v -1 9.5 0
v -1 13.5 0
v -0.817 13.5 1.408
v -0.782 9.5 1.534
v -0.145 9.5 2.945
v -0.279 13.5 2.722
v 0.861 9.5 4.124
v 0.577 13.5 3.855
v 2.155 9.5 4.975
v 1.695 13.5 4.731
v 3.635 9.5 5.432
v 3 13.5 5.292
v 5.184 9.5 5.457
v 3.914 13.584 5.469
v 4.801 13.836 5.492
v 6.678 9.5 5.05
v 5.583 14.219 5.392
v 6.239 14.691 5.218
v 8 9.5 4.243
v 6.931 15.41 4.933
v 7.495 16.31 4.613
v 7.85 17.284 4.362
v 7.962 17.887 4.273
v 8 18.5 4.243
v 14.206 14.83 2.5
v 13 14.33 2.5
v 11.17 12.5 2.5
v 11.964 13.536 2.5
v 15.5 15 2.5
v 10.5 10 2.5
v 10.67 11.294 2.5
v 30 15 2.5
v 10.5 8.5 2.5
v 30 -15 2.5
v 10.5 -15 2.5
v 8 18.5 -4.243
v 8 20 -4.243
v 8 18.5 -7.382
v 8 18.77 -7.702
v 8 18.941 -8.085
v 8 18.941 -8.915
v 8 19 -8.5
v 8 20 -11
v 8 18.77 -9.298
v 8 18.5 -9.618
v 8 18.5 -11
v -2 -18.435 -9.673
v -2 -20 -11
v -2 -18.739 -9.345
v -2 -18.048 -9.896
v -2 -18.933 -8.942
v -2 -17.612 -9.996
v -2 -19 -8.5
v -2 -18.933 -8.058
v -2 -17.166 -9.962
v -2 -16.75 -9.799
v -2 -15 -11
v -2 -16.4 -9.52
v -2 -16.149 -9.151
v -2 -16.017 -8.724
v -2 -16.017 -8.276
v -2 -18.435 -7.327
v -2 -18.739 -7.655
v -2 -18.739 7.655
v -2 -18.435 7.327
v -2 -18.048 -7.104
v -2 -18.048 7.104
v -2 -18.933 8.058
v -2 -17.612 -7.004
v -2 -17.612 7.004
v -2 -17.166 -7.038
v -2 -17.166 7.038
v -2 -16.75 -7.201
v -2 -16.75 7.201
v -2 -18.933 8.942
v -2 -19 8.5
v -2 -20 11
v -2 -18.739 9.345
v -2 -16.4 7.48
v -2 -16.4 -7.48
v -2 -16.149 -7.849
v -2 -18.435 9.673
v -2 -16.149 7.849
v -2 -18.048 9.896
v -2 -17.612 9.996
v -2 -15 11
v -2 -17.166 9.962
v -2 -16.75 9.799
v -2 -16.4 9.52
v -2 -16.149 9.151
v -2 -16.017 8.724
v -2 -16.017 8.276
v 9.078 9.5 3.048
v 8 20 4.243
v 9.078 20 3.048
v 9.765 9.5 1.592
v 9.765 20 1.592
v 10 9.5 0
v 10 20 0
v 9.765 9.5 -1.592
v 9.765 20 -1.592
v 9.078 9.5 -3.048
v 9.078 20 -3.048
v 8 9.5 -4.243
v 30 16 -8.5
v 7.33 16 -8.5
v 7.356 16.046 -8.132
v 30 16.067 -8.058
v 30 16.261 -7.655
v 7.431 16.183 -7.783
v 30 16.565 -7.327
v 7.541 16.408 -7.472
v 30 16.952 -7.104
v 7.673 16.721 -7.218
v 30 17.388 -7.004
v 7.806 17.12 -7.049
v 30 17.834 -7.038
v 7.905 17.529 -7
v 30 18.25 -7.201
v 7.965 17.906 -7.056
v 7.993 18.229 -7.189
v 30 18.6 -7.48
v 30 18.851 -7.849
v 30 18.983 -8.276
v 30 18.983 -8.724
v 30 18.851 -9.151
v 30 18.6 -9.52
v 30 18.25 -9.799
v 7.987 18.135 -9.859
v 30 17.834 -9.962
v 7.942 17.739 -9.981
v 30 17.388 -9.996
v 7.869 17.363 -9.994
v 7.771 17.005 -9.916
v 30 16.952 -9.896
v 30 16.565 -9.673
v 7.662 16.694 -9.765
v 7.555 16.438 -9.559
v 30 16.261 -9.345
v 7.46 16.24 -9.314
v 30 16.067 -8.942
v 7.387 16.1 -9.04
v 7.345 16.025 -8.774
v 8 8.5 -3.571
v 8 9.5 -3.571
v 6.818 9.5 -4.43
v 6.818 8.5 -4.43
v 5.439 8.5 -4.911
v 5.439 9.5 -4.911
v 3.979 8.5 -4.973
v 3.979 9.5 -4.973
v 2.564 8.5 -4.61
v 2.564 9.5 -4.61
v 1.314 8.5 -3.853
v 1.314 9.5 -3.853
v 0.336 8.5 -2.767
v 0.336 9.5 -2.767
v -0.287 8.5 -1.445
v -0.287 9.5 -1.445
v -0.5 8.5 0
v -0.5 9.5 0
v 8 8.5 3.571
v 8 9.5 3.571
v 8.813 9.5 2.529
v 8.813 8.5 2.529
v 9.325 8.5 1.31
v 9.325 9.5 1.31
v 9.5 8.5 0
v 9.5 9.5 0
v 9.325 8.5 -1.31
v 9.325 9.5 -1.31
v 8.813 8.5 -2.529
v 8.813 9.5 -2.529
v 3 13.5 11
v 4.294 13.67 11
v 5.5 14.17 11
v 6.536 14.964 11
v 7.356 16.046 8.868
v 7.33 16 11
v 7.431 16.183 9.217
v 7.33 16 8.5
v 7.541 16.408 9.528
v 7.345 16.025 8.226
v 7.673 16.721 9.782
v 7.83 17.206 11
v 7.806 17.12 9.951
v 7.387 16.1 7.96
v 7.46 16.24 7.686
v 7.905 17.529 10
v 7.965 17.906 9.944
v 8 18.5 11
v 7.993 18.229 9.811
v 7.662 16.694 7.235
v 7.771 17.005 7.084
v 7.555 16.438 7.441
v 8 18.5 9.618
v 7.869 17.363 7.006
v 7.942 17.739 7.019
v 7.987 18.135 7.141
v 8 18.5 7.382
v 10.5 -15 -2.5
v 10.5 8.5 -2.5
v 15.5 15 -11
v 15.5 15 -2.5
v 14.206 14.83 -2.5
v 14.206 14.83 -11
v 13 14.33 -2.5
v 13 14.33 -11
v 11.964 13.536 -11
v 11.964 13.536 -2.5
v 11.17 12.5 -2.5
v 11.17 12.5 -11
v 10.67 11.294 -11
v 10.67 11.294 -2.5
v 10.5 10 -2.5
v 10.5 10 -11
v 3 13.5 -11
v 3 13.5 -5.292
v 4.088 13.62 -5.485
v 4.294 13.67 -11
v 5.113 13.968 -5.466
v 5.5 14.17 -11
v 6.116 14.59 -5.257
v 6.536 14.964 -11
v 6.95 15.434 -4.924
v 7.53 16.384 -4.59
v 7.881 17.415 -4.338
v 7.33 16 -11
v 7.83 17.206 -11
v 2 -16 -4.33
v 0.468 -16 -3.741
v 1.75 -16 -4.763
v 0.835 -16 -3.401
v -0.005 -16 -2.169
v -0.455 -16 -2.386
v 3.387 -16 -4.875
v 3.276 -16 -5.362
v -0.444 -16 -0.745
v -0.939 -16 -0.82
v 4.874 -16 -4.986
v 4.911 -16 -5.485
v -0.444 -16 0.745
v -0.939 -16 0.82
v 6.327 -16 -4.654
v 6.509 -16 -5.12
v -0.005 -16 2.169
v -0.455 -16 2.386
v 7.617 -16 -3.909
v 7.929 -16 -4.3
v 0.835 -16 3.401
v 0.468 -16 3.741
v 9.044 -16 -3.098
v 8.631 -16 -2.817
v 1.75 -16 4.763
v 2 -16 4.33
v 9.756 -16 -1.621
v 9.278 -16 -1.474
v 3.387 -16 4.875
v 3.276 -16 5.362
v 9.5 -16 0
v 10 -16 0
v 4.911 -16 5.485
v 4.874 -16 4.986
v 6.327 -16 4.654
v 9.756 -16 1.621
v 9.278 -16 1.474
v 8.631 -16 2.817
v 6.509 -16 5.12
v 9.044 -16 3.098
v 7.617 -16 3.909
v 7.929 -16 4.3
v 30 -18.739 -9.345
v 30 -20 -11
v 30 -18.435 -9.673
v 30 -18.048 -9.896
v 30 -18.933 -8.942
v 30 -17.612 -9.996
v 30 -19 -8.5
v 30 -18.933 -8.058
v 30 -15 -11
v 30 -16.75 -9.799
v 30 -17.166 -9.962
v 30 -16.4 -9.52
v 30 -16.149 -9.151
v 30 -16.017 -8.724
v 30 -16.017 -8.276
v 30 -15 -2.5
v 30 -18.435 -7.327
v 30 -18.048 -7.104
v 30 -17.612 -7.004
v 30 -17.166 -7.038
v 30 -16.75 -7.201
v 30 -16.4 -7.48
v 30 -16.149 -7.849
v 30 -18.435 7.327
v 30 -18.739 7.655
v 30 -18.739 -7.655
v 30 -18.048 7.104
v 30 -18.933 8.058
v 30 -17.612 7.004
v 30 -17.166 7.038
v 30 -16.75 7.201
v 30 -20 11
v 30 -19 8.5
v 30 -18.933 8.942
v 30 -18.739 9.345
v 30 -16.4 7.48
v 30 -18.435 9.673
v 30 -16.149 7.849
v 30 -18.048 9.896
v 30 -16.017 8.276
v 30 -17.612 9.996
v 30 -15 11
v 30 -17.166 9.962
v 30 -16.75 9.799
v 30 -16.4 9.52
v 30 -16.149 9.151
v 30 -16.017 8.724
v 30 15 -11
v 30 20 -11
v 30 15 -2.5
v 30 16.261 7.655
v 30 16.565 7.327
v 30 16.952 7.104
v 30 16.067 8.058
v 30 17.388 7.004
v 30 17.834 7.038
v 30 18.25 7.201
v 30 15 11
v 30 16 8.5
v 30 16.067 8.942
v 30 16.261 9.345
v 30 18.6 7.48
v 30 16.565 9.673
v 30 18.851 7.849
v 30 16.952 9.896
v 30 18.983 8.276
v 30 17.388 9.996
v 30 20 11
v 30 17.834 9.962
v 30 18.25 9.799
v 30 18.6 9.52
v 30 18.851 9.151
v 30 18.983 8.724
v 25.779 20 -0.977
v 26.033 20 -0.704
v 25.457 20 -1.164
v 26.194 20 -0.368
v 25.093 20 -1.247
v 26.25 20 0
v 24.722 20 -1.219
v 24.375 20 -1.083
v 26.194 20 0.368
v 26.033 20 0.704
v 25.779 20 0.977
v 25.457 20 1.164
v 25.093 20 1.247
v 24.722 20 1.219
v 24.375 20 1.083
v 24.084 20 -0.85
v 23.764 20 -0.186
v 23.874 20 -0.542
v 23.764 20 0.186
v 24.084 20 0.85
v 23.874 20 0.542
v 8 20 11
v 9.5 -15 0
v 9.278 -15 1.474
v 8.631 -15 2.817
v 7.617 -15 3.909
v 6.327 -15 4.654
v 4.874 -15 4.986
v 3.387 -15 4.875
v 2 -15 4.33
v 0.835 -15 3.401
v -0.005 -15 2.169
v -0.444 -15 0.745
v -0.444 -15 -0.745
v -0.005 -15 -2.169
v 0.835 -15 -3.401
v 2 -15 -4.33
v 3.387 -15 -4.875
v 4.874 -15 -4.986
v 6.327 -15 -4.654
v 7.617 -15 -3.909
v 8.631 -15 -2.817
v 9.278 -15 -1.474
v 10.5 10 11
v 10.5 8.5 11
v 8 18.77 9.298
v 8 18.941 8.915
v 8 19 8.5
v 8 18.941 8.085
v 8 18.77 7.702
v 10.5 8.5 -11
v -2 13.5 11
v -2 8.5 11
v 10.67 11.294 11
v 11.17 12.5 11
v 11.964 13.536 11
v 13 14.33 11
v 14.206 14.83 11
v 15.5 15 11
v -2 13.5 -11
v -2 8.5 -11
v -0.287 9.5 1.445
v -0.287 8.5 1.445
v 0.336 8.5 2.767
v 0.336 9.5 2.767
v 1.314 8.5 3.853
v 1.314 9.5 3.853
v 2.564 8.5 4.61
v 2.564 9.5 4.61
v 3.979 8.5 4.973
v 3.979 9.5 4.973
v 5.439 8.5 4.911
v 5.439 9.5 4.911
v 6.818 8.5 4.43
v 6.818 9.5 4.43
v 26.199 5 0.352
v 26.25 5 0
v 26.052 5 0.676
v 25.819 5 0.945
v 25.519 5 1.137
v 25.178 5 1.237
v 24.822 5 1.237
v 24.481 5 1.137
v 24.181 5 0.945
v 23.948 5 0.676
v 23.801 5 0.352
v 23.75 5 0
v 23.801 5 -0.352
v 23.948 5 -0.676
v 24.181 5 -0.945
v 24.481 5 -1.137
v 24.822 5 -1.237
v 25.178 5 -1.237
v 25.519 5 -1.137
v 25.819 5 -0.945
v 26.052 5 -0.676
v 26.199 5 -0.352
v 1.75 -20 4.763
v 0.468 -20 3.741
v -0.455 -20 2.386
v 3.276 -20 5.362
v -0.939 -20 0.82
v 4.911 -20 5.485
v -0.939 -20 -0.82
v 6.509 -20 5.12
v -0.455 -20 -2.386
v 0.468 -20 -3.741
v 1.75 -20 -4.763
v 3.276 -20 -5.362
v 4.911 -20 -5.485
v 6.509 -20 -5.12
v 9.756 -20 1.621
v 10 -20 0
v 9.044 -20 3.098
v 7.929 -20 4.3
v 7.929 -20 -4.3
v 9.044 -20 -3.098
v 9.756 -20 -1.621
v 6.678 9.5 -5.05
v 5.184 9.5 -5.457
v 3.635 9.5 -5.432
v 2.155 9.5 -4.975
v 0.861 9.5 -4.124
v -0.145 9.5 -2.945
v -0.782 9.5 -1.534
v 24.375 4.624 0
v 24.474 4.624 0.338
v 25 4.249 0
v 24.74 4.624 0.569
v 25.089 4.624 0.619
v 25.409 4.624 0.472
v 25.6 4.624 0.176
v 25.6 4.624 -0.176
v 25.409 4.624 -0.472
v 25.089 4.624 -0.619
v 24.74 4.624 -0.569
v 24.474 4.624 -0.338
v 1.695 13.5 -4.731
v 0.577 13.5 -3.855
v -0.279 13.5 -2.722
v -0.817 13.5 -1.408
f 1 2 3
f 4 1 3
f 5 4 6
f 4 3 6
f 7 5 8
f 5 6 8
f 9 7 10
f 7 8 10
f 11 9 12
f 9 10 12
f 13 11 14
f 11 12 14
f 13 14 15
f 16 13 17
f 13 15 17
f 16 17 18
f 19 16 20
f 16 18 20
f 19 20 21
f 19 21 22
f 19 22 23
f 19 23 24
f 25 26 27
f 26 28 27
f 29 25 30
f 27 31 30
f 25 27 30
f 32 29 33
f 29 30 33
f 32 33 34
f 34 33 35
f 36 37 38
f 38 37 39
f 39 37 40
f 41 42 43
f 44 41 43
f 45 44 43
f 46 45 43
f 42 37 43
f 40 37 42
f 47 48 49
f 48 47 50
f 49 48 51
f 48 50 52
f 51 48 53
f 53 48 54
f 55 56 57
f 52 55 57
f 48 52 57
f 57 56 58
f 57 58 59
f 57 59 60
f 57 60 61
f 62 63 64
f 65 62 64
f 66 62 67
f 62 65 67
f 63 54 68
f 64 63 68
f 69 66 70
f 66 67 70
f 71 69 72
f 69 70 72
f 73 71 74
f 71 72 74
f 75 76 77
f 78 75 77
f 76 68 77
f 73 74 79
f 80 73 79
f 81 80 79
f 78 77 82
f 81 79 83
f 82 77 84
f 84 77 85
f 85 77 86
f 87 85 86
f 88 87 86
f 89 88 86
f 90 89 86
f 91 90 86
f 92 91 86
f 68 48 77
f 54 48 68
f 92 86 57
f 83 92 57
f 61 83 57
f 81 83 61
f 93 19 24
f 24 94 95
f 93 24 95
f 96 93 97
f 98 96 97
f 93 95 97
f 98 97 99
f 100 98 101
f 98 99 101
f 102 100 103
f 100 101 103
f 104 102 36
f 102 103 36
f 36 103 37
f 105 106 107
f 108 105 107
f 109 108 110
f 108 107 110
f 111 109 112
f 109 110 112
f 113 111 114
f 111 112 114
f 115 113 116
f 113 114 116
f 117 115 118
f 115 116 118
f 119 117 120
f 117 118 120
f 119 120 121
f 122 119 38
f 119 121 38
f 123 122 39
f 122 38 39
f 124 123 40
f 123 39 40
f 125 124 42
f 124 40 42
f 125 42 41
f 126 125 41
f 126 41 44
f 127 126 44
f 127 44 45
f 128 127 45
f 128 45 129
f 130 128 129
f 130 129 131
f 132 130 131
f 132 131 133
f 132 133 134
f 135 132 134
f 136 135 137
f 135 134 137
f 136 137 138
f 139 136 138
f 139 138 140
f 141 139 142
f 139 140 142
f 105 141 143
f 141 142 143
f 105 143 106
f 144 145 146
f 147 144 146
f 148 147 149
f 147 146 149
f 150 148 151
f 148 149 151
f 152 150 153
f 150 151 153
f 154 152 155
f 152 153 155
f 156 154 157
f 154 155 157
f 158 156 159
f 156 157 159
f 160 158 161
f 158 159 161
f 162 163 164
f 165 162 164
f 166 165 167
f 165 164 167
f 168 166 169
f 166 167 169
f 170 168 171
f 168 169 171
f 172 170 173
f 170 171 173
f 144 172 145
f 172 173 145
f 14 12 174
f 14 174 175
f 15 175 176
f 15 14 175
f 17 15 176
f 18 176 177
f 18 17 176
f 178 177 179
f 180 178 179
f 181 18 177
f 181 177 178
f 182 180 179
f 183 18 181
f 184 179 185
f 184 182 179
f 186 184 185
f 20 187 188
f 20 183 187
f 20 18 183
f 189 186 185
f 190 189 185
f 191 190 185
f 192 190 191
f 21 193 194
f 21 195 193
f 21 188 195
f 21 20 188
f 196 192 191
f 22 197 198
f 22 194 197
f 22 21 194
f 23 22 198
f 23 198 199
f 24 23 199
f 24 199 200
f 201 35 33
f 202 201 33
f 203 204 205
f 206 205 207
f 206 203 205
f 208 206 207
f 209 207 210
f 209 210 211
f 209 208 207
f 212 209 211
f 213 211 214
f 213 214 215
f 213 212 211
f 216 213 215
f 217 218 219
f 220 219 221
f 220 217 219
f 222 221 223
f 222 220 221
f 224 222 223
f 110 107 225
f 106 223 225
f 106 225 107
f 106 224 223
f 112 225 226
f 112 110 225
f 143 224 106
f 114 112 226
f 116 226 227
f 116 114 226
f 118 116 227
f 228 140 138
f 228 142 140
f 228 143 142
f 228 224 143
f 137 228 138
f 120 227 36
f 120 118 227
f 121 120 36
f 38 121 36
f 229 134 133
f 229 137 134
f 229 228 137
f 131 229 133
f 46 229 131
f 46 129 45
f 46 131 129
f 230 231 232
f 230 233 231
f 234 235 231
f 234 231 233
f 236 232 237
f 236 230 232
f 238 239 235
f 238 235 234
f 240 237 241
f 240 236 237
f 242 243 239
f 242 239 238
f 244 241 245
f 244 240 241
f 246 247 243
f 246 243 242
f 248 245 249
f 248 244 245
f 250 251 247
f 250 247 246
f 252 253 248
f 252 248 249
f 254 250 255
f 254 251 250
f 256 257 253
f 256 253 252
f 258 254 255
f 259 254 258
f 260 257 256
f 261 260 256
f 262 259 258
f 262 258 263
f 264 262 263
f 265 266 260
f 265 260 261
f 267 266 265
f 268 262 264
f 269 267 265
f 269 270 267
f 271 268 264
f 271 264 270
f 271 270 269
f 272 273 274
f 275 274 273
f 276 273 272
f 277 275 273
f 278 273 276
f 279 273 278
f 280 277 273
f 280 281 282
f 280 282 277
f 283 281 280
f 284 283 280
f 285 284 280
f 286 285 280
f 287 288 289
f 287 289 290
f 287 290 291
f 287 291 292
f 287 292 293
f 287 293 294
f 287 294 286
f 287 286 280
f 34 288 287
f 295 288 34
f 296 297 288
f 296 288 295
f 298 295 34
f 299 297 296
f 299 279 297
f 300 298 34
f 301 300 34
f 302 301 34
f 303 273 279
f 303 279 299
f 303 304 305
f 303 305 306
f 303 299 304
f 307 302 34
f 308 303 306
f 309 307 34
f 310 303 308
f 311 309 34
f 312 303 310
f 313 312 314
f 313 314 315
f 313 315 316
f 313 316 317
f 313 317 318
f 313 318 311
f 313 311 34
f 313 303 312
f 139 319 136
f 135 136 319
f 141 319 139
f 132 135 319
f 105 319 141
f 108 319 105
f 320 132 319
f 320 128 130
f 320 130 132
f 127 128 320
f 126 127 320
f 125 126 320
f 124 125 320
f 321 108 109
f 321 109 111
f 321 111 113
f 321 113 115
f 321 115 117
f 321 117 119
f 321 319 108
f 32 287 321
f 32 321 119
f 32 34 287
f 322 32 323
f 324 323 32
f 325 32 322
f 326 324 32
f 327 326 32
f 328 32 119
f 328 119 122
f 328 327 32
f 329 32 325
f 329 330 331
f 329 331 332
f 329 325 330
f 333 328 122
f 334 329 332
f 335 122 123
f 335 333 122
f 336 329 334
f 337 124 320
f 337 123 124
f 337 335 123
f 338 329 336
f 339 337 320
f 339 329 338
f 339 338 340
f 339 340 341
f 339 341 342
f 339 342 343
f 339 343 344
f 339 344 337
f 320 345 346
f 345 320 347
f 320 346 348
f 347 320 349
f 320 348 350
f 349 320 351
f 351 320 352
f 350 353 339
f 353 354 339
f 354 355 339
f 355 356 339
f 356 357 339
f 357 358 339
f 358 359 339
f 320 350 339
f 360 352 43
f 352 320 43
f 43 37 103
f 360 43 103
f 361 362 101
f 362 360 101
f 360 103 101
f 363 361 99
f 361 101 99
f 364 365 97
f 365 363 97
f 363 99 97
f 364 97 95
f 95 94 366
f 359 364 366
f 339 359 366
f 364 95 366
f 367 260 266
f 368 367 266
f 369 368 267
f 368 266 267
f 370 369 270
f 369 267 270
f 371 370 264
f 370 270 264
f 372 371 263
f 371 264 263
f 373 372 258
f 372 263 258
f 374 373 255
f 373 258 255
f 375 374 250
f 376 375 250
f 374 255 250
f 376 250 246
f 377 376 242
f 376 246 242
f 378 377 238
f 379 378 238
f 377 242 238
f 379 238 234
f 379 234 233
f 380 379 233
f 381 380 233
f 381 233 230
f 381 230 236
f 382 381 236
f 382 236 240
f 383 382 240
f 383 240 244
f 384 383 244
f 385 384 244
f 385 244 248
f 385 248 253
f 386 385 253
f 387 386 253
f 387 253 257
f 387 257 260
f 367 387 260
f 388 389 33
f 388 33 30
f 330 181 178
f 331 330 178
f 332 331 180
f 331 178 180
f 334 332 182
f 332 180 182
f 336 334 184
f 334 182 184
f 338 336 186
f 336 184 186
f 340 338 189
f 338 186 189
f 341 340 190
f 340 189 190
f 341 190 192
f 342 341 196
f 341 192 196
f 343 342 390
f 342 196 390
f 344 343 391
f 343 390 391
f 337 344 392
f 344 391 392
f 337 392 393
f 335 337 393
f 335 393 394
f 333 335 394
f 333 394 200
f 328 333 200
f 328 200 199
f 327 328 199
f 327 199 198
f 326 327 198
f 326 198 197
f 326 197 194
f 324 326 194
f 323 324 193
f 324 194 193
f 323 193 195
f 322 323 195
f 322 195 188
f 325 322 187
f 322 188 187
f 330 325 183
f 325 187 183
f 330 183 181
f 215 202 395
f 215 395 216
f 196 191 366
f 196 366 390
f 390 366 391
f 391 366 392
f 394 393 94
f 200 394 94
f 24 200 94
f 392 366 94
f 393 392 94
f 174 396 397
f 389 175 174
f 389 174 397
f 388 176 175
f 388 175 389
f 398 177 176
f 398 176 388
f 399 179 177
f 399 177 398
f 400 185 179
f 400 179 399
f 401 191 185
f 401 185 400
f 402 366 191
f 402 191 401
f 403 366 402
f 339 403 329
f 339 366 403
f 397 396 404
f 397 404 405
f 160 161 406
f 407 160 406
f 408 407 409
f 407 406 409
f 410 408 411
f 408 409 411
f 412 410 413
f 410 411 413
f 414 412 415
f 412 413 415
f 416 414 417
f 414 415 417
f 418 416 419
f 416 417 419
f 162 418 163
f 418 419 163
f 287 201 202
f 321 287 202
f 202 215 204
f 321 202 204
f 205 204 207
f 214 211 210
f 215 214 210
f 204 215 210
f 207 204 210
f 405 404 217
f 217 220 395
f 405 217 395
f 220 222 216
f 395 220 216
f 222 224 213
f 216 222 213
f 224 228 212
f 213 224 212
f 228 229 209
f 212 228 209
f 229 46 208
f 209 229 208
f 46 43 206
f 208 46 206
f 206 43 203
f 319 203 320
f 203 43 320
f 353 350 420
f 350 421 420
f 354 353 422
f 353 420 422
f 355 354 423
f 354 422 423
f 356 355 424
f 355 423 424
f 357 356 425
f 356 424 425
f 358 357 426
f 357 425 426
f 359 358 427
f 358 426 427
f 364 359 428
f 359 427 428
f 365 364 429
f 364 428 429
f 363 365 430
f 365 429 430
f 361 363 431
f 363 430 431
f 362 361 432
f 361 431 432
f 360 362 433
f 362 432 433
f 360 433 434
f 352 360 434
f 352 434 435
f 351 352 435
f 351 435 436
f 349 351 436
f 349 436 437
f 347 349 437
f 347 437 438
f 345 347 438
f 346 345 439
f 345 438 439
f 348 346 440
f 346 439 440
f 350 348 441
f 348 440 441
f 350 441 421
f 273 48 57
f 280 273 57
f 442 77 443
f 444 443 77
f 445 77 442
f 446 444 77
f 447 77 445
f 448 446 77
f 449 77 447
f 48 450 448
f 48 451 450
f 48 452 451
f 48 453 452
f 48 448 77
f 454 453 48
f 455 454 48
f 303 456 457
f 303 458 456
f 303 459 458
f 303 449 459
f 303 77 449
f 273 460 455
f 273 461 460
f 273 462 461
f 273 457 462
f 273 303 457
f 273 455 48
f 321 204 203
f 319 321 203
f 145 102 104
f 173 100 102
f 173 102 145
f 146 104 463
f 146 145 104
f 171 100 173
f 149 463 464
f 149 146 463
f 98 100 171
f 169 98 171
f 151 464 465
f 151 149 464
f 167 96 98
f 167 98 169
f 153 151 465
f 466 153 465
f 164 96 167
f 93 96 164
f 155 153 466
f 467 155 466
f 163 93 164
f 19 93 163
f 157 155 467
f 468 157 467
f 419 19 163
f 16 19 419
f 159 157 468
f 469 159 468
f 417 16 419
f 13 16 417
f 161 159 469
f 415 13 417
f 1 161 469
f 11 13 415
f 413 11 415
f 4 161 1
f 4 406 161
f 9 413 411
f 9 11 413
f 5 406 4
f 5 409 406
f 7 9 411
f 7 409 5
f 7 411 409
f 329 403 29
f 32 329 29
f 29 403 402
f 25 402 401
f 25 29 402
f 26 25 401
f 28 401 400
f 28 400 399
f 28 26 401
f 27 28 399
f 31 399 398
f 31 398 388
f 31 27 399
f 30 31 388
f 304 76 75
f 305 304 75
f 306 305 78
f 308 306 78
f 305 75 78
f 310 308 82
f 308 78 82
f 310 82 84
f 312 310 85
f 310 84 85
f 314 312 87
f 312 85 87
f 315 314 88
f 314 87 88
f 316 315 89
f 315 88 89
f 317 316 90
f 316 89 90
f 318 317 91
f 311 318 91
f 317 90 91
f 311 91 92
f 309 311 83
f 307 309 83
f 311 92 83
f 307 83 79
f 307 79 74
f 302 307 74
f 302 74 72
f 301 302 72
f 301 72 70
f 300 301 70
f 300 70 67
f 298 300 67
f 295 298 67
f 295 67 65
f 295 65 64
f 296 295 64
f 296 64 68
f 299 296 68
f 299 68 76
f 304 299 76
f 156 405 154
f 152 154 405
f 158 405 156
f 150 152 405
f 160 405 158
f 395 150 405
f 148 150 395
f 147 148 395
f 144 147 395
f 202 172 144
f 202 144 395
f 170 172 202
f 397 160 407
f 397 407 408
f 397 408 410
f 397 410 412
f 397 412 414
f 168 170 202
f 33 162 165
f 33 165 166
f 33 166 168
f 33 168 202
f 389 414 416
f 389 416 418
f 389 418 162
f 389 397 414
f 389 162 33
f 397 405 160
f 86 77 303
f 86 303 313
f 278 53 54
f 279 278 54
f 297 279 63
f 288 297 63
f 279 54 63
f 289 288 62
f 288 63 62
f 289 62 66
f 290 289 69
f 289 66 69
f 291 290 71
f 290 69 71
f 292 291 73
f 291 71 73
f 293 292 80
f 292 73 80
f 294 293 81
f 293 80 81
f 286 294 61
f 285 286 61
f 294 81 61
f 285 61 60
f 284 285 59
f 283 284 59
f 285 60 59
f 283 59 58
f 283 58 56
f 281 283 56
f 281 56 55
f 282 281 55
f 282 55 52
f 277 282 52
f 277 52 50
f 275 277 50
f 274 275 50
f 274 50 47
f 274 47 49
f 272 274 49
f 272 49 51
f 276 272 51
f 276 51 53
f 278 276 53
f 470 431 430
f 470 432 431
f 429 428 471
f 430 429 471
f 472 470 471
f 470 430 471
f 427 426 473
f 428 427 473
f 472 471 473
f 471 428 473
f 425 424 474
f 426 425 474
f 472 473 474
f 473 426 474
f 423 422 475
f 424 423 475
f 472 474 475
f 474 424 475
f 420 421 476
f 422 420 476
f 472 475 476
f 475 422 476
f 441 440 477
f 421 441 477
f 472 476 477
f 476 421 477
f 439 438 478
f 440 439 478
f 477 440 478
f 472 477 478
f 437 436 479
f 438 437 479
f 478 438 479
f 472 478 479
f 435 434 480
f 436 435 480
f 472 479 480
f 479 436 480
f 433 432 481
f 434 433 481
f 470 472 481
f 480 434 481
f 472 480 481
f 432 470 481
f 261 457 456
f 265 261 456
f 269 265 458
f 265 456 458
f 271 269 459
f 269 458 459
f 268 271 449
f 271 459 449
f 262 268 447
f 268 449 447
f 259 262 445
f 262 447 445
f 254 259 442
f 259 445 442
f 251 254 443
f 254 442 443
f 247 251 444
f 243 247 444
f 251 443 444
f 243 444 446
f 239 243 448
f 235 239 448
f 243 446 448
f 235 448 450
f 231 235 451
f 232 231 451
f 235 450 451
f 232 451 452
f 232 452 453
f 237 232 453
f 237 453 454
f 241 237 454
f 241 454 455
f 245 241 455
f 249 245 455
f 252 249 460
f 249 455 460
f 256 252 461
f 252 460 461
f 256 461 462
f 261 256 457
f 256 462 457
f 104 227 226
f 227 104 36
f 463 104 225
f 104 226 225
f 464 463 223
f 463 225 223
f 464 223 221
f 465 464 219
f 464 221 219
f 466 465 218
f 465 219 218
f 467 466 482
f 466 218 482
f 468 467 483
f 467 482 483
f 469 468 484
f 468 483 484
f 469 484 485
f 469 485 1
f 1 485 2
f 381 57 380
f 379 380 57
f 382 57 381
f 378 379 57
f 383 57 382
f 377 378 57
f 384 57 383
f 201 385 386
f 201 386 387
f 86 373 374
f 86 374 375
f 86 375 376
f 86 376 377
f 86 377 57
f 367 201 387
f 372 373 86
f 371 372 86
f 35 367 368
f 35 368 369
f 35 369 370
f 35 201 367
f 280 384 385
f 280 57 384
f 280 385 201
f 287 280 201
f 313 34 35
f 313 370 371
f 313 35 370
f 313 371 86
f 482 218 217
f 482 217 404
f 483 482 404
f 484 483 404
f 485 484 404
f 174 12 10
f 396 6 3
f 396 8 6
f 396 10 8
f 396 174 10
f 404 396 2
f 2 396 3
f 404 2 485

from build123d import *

# Parameters (mm, degrees)
F0_W      = 5
F0_H      = 5
F0_H_2    = 8.5
F0_W_2    = 30
F1_DEPTH  = 30
F2_DEPTH  = 2
F4_W      = 10.5
F4_H      = 30
F5_DEPTH  = 13.501
F3_R      = 5.5
F3_R_2    = 5
F3_R_3    = 2.5
F6_DEPTH  = 4
F7_DEPTH  = 5
F9_DEPTH  = 22
F10_DEPTH = 8
F11_DEPTH = 1.5
F12_R     = 5
F13_R     = 5
F15_DEPTH = 10.5
F14_R     = 2.5
F16_DEPTH = 11.5
F18_D     = 3
F20_D     = 2.5
F20_DEPTH = 15
F20_TIP   = 0.7510757738


# Not quite as in the source:
# - a feature names something its author has since deleted; it is built from what else it names


with BuildPart() as f1:
    # F0 (on Right) → F1 (new body)
    with BuildSketch(Plane.YZ):
        with Locations((17.5, 0)):
            Rectangle(F0_W, F0_H)
        with Locations((17.5, 6.75)):
            Rectangle(F0_W, F0_H_2)
        Rectangle(F0_W_2, F0_H)
        with Locations((17.5, -6.75)):
            Rectangle(F0_W, F0_H_2)
        with Locations((-17.5, 0)):
            Rectangle(F0_W, F0_H)
        with Locations((-17.5, 6.75)):
            Rectangle(F0_W, F0_H_2)
        with Locations((-17.5, -6.75)):
            Rectangle(F0_W, F0_H_2)
    extrude(amount=F1_DEPTH)

    # F0 (on Right) → F2 (join)
    with BuildSketch(Plane.YZ):
        with Locations((-17.5, 6.75)):
            Rectangle(F0_W, F0_H_2)
        with Locations((-17.5, 0)):
            Rectangle(F0_W, F0_H)
        with Locations((-17.5, -6.75)):
            Rectangle(F0_W, F0_H_2)
    extrude(amount=-F2_DEPTH)

    # F4 (on face) → F5 (cut, through all)
    with BuildSketch(Plane.XY.offset(2.5)):
        with Locations((5.25, 0)):
            Rectangle(F4_W, F4_H)
    extrude(amount=-F5_DEPTH, mode=Mode.SUBTRACT)

    # F3 (on face) → F6 (cut)
    with BuildSketch(Plane.XZ.offset(20)):
        with Locations((4.5, 0)):
            Circle(F3_R)
        with Locations((4.5, 0)):
            Circle(F3_R_2, mode=Mode.SUBTRACT)
        with Locations((4.5, 0)):
            Circle(F3_R_2)
        with Locations((4.5, 0)):
            Circle(F3_R_3, mode=Mode.SUBTRACT)
        with Locations((4.5, 0)):
            Circle(F3_R_3)
    extrude(amount=-F6_DEPTH, mode=Mode.SUBTRACT)

    # F3 (on face) → F7 (cut, through all)
    with BuildSketch(Plane.XZ.offset(20)):
        with Locations((4.5, 0)):
            Circle(F3_R_2)
        with Locations((4.5, 0)):
            Circle(F3_R_3, mode=Mode.SUBTRACT)
        with Locations((4.5, 0)):
            Circle(F3_R_3)
    extrude(amount=-F7_DEPTH, mode=Mode.SUBTRACT)

    # F8 (on face) → F9 (join, through all)
    with BuildSketch(Plane.XY.offset(11)):
        Polygon((10.5, 8.5), (10.5, 15), (0, 15), (-2, 15), (-2, 8.5), align=None)
    extrude(amount=-F9_DEPTH)

    # F10 (cut): a face of the model
    f10_faces = [f1.faces().sort_by_distance(p)[0] for p in [
        (0, 17.5, 0),
    ]]
    extrude(f10_faces, amount=-F10_DEPTH, mode=Mode.SUBTRACT)

    # F11 (cut): a face of the model
    f11_faces = [f1.faces().sort_by_distance(p)[0] for p in [
        (3, 15, 0),
    ]]
    extrude(f11_faces, amount=-F11_DEPTH, mode=Mode.SUBTRACT)

    # F12
    f12_edges = [f1.edges().sort_by_distance(p)[0] for p in [
        (8, 13.5, 0),
    ]]
    fillet(f12_edges, radius=F12_R)

    # F13
    f13_edges = [f1.edges().sort_by_distance(p)[0] for p in [
        (10.5, 15, 6.75),
        (10.5, 15, -6.75),
    ]]
    fillet(f13_edges, radius=F13_R)

    # F14 (on face) → F15 (cut)
    with BuildSketch(Plane(origin=(0, 20, 0), x_dir=(-1, 0, 0), z_dir=(0, 1, 0))):
        with BuildLine():
            Line((-8, 3.5707142143), (-8, 4.2426406871))
            ThreePointArc((-8, 4.2426406871), (-10, 0), (-8, -4.2426406871))
            Line((-8, -4.2426406871), (-8, -3.5707142143))
            ThreePointArc((-8, -3.5707142143), (-9.5, 0), (-8, 3.5707142143))
        make_face()
        with BuildLine():
            ThreePointArc((-8, -4.2426406871), (-2.1547921201, -4.9749371855), (1, 0))
            ThreePointArc((1, 0), (-2.1547921201, 4.9749371855), (-8, 4.2426406871))
            Line((-8, 4.2426406871), (-8, 3.5707142143))
            ThreePointArc((-8, 3.5707142143), (-2.5635083269, 4.6097722286), (0.5, 0))
            ThreePointArc((0.5, 0), (-2.5635083269, -4.6097722286), (-8, -3.5707142143))
            Line((-8, -3.5707142143), (-8, -4.2426406871))
        make_face()
    extrude(amount=-F15_DEPTH, mode=Mode.SUBTRACT)

    # F14 (on face) → F16 (cut, through all)
    with BuildSketch(Plane(origin=(0, 20, 0), x_dir=(-1, 0, 0), z_dir=(0, 1, 0))):
        with BuildLine():
            ThreePointArc((0.5, 0), (-2.5635083269, 4.6097722286), (-8, 3.5707142143))
            Line((-8, 3.5707142143), (-8, -3.5707142143))
            ThreePointArc((-8, -3.5707142143), (-2.5635083269, -4.6097722286), (0.5, 0))
        make_face()
        with Locations((-4.5, 0)):
            Circle(F14_R, mode=Mode.SUBTRACT)
        with Locations((-4.5, 0)):
            Circle(F14_R)
        with BuildLine():
            Line((-8, -3.5707142143), (-8, 3.5707142143))
            ThreePointArc((-8, 3.5707142143), (-9.5, 0), (-8, -3.5707142143))
        make_face()
    extrude(amount=-F16_DEPTH, mode=Mode.SUBTRACT)

    # F18 (through all)
    with Locations(Plane.YZ.offset(30)):
        with Locations((-17.5, 8.5), (-17.5, -8.5), (17.5, 8.5), (17.5, -8.5)):
            Hole(F18_D / 2)

    # F20
    with Locations(Plane(origin=(0, 20, 0), x_dir=(-1, 0, 0), z_dir=(0, 1, 0))):
        with Locations((-25, 0)):
            Hole(F20_D / 2, depth=F20_DEPTH)
            with Locations((0, 0, -(F20_DEPTH + F20_TIP / 2))):  # 118° drill point
                Cone(0, F20_D / 2, F20_TIP, mode=Mode.SUBTRACT)


solid = f1.part
